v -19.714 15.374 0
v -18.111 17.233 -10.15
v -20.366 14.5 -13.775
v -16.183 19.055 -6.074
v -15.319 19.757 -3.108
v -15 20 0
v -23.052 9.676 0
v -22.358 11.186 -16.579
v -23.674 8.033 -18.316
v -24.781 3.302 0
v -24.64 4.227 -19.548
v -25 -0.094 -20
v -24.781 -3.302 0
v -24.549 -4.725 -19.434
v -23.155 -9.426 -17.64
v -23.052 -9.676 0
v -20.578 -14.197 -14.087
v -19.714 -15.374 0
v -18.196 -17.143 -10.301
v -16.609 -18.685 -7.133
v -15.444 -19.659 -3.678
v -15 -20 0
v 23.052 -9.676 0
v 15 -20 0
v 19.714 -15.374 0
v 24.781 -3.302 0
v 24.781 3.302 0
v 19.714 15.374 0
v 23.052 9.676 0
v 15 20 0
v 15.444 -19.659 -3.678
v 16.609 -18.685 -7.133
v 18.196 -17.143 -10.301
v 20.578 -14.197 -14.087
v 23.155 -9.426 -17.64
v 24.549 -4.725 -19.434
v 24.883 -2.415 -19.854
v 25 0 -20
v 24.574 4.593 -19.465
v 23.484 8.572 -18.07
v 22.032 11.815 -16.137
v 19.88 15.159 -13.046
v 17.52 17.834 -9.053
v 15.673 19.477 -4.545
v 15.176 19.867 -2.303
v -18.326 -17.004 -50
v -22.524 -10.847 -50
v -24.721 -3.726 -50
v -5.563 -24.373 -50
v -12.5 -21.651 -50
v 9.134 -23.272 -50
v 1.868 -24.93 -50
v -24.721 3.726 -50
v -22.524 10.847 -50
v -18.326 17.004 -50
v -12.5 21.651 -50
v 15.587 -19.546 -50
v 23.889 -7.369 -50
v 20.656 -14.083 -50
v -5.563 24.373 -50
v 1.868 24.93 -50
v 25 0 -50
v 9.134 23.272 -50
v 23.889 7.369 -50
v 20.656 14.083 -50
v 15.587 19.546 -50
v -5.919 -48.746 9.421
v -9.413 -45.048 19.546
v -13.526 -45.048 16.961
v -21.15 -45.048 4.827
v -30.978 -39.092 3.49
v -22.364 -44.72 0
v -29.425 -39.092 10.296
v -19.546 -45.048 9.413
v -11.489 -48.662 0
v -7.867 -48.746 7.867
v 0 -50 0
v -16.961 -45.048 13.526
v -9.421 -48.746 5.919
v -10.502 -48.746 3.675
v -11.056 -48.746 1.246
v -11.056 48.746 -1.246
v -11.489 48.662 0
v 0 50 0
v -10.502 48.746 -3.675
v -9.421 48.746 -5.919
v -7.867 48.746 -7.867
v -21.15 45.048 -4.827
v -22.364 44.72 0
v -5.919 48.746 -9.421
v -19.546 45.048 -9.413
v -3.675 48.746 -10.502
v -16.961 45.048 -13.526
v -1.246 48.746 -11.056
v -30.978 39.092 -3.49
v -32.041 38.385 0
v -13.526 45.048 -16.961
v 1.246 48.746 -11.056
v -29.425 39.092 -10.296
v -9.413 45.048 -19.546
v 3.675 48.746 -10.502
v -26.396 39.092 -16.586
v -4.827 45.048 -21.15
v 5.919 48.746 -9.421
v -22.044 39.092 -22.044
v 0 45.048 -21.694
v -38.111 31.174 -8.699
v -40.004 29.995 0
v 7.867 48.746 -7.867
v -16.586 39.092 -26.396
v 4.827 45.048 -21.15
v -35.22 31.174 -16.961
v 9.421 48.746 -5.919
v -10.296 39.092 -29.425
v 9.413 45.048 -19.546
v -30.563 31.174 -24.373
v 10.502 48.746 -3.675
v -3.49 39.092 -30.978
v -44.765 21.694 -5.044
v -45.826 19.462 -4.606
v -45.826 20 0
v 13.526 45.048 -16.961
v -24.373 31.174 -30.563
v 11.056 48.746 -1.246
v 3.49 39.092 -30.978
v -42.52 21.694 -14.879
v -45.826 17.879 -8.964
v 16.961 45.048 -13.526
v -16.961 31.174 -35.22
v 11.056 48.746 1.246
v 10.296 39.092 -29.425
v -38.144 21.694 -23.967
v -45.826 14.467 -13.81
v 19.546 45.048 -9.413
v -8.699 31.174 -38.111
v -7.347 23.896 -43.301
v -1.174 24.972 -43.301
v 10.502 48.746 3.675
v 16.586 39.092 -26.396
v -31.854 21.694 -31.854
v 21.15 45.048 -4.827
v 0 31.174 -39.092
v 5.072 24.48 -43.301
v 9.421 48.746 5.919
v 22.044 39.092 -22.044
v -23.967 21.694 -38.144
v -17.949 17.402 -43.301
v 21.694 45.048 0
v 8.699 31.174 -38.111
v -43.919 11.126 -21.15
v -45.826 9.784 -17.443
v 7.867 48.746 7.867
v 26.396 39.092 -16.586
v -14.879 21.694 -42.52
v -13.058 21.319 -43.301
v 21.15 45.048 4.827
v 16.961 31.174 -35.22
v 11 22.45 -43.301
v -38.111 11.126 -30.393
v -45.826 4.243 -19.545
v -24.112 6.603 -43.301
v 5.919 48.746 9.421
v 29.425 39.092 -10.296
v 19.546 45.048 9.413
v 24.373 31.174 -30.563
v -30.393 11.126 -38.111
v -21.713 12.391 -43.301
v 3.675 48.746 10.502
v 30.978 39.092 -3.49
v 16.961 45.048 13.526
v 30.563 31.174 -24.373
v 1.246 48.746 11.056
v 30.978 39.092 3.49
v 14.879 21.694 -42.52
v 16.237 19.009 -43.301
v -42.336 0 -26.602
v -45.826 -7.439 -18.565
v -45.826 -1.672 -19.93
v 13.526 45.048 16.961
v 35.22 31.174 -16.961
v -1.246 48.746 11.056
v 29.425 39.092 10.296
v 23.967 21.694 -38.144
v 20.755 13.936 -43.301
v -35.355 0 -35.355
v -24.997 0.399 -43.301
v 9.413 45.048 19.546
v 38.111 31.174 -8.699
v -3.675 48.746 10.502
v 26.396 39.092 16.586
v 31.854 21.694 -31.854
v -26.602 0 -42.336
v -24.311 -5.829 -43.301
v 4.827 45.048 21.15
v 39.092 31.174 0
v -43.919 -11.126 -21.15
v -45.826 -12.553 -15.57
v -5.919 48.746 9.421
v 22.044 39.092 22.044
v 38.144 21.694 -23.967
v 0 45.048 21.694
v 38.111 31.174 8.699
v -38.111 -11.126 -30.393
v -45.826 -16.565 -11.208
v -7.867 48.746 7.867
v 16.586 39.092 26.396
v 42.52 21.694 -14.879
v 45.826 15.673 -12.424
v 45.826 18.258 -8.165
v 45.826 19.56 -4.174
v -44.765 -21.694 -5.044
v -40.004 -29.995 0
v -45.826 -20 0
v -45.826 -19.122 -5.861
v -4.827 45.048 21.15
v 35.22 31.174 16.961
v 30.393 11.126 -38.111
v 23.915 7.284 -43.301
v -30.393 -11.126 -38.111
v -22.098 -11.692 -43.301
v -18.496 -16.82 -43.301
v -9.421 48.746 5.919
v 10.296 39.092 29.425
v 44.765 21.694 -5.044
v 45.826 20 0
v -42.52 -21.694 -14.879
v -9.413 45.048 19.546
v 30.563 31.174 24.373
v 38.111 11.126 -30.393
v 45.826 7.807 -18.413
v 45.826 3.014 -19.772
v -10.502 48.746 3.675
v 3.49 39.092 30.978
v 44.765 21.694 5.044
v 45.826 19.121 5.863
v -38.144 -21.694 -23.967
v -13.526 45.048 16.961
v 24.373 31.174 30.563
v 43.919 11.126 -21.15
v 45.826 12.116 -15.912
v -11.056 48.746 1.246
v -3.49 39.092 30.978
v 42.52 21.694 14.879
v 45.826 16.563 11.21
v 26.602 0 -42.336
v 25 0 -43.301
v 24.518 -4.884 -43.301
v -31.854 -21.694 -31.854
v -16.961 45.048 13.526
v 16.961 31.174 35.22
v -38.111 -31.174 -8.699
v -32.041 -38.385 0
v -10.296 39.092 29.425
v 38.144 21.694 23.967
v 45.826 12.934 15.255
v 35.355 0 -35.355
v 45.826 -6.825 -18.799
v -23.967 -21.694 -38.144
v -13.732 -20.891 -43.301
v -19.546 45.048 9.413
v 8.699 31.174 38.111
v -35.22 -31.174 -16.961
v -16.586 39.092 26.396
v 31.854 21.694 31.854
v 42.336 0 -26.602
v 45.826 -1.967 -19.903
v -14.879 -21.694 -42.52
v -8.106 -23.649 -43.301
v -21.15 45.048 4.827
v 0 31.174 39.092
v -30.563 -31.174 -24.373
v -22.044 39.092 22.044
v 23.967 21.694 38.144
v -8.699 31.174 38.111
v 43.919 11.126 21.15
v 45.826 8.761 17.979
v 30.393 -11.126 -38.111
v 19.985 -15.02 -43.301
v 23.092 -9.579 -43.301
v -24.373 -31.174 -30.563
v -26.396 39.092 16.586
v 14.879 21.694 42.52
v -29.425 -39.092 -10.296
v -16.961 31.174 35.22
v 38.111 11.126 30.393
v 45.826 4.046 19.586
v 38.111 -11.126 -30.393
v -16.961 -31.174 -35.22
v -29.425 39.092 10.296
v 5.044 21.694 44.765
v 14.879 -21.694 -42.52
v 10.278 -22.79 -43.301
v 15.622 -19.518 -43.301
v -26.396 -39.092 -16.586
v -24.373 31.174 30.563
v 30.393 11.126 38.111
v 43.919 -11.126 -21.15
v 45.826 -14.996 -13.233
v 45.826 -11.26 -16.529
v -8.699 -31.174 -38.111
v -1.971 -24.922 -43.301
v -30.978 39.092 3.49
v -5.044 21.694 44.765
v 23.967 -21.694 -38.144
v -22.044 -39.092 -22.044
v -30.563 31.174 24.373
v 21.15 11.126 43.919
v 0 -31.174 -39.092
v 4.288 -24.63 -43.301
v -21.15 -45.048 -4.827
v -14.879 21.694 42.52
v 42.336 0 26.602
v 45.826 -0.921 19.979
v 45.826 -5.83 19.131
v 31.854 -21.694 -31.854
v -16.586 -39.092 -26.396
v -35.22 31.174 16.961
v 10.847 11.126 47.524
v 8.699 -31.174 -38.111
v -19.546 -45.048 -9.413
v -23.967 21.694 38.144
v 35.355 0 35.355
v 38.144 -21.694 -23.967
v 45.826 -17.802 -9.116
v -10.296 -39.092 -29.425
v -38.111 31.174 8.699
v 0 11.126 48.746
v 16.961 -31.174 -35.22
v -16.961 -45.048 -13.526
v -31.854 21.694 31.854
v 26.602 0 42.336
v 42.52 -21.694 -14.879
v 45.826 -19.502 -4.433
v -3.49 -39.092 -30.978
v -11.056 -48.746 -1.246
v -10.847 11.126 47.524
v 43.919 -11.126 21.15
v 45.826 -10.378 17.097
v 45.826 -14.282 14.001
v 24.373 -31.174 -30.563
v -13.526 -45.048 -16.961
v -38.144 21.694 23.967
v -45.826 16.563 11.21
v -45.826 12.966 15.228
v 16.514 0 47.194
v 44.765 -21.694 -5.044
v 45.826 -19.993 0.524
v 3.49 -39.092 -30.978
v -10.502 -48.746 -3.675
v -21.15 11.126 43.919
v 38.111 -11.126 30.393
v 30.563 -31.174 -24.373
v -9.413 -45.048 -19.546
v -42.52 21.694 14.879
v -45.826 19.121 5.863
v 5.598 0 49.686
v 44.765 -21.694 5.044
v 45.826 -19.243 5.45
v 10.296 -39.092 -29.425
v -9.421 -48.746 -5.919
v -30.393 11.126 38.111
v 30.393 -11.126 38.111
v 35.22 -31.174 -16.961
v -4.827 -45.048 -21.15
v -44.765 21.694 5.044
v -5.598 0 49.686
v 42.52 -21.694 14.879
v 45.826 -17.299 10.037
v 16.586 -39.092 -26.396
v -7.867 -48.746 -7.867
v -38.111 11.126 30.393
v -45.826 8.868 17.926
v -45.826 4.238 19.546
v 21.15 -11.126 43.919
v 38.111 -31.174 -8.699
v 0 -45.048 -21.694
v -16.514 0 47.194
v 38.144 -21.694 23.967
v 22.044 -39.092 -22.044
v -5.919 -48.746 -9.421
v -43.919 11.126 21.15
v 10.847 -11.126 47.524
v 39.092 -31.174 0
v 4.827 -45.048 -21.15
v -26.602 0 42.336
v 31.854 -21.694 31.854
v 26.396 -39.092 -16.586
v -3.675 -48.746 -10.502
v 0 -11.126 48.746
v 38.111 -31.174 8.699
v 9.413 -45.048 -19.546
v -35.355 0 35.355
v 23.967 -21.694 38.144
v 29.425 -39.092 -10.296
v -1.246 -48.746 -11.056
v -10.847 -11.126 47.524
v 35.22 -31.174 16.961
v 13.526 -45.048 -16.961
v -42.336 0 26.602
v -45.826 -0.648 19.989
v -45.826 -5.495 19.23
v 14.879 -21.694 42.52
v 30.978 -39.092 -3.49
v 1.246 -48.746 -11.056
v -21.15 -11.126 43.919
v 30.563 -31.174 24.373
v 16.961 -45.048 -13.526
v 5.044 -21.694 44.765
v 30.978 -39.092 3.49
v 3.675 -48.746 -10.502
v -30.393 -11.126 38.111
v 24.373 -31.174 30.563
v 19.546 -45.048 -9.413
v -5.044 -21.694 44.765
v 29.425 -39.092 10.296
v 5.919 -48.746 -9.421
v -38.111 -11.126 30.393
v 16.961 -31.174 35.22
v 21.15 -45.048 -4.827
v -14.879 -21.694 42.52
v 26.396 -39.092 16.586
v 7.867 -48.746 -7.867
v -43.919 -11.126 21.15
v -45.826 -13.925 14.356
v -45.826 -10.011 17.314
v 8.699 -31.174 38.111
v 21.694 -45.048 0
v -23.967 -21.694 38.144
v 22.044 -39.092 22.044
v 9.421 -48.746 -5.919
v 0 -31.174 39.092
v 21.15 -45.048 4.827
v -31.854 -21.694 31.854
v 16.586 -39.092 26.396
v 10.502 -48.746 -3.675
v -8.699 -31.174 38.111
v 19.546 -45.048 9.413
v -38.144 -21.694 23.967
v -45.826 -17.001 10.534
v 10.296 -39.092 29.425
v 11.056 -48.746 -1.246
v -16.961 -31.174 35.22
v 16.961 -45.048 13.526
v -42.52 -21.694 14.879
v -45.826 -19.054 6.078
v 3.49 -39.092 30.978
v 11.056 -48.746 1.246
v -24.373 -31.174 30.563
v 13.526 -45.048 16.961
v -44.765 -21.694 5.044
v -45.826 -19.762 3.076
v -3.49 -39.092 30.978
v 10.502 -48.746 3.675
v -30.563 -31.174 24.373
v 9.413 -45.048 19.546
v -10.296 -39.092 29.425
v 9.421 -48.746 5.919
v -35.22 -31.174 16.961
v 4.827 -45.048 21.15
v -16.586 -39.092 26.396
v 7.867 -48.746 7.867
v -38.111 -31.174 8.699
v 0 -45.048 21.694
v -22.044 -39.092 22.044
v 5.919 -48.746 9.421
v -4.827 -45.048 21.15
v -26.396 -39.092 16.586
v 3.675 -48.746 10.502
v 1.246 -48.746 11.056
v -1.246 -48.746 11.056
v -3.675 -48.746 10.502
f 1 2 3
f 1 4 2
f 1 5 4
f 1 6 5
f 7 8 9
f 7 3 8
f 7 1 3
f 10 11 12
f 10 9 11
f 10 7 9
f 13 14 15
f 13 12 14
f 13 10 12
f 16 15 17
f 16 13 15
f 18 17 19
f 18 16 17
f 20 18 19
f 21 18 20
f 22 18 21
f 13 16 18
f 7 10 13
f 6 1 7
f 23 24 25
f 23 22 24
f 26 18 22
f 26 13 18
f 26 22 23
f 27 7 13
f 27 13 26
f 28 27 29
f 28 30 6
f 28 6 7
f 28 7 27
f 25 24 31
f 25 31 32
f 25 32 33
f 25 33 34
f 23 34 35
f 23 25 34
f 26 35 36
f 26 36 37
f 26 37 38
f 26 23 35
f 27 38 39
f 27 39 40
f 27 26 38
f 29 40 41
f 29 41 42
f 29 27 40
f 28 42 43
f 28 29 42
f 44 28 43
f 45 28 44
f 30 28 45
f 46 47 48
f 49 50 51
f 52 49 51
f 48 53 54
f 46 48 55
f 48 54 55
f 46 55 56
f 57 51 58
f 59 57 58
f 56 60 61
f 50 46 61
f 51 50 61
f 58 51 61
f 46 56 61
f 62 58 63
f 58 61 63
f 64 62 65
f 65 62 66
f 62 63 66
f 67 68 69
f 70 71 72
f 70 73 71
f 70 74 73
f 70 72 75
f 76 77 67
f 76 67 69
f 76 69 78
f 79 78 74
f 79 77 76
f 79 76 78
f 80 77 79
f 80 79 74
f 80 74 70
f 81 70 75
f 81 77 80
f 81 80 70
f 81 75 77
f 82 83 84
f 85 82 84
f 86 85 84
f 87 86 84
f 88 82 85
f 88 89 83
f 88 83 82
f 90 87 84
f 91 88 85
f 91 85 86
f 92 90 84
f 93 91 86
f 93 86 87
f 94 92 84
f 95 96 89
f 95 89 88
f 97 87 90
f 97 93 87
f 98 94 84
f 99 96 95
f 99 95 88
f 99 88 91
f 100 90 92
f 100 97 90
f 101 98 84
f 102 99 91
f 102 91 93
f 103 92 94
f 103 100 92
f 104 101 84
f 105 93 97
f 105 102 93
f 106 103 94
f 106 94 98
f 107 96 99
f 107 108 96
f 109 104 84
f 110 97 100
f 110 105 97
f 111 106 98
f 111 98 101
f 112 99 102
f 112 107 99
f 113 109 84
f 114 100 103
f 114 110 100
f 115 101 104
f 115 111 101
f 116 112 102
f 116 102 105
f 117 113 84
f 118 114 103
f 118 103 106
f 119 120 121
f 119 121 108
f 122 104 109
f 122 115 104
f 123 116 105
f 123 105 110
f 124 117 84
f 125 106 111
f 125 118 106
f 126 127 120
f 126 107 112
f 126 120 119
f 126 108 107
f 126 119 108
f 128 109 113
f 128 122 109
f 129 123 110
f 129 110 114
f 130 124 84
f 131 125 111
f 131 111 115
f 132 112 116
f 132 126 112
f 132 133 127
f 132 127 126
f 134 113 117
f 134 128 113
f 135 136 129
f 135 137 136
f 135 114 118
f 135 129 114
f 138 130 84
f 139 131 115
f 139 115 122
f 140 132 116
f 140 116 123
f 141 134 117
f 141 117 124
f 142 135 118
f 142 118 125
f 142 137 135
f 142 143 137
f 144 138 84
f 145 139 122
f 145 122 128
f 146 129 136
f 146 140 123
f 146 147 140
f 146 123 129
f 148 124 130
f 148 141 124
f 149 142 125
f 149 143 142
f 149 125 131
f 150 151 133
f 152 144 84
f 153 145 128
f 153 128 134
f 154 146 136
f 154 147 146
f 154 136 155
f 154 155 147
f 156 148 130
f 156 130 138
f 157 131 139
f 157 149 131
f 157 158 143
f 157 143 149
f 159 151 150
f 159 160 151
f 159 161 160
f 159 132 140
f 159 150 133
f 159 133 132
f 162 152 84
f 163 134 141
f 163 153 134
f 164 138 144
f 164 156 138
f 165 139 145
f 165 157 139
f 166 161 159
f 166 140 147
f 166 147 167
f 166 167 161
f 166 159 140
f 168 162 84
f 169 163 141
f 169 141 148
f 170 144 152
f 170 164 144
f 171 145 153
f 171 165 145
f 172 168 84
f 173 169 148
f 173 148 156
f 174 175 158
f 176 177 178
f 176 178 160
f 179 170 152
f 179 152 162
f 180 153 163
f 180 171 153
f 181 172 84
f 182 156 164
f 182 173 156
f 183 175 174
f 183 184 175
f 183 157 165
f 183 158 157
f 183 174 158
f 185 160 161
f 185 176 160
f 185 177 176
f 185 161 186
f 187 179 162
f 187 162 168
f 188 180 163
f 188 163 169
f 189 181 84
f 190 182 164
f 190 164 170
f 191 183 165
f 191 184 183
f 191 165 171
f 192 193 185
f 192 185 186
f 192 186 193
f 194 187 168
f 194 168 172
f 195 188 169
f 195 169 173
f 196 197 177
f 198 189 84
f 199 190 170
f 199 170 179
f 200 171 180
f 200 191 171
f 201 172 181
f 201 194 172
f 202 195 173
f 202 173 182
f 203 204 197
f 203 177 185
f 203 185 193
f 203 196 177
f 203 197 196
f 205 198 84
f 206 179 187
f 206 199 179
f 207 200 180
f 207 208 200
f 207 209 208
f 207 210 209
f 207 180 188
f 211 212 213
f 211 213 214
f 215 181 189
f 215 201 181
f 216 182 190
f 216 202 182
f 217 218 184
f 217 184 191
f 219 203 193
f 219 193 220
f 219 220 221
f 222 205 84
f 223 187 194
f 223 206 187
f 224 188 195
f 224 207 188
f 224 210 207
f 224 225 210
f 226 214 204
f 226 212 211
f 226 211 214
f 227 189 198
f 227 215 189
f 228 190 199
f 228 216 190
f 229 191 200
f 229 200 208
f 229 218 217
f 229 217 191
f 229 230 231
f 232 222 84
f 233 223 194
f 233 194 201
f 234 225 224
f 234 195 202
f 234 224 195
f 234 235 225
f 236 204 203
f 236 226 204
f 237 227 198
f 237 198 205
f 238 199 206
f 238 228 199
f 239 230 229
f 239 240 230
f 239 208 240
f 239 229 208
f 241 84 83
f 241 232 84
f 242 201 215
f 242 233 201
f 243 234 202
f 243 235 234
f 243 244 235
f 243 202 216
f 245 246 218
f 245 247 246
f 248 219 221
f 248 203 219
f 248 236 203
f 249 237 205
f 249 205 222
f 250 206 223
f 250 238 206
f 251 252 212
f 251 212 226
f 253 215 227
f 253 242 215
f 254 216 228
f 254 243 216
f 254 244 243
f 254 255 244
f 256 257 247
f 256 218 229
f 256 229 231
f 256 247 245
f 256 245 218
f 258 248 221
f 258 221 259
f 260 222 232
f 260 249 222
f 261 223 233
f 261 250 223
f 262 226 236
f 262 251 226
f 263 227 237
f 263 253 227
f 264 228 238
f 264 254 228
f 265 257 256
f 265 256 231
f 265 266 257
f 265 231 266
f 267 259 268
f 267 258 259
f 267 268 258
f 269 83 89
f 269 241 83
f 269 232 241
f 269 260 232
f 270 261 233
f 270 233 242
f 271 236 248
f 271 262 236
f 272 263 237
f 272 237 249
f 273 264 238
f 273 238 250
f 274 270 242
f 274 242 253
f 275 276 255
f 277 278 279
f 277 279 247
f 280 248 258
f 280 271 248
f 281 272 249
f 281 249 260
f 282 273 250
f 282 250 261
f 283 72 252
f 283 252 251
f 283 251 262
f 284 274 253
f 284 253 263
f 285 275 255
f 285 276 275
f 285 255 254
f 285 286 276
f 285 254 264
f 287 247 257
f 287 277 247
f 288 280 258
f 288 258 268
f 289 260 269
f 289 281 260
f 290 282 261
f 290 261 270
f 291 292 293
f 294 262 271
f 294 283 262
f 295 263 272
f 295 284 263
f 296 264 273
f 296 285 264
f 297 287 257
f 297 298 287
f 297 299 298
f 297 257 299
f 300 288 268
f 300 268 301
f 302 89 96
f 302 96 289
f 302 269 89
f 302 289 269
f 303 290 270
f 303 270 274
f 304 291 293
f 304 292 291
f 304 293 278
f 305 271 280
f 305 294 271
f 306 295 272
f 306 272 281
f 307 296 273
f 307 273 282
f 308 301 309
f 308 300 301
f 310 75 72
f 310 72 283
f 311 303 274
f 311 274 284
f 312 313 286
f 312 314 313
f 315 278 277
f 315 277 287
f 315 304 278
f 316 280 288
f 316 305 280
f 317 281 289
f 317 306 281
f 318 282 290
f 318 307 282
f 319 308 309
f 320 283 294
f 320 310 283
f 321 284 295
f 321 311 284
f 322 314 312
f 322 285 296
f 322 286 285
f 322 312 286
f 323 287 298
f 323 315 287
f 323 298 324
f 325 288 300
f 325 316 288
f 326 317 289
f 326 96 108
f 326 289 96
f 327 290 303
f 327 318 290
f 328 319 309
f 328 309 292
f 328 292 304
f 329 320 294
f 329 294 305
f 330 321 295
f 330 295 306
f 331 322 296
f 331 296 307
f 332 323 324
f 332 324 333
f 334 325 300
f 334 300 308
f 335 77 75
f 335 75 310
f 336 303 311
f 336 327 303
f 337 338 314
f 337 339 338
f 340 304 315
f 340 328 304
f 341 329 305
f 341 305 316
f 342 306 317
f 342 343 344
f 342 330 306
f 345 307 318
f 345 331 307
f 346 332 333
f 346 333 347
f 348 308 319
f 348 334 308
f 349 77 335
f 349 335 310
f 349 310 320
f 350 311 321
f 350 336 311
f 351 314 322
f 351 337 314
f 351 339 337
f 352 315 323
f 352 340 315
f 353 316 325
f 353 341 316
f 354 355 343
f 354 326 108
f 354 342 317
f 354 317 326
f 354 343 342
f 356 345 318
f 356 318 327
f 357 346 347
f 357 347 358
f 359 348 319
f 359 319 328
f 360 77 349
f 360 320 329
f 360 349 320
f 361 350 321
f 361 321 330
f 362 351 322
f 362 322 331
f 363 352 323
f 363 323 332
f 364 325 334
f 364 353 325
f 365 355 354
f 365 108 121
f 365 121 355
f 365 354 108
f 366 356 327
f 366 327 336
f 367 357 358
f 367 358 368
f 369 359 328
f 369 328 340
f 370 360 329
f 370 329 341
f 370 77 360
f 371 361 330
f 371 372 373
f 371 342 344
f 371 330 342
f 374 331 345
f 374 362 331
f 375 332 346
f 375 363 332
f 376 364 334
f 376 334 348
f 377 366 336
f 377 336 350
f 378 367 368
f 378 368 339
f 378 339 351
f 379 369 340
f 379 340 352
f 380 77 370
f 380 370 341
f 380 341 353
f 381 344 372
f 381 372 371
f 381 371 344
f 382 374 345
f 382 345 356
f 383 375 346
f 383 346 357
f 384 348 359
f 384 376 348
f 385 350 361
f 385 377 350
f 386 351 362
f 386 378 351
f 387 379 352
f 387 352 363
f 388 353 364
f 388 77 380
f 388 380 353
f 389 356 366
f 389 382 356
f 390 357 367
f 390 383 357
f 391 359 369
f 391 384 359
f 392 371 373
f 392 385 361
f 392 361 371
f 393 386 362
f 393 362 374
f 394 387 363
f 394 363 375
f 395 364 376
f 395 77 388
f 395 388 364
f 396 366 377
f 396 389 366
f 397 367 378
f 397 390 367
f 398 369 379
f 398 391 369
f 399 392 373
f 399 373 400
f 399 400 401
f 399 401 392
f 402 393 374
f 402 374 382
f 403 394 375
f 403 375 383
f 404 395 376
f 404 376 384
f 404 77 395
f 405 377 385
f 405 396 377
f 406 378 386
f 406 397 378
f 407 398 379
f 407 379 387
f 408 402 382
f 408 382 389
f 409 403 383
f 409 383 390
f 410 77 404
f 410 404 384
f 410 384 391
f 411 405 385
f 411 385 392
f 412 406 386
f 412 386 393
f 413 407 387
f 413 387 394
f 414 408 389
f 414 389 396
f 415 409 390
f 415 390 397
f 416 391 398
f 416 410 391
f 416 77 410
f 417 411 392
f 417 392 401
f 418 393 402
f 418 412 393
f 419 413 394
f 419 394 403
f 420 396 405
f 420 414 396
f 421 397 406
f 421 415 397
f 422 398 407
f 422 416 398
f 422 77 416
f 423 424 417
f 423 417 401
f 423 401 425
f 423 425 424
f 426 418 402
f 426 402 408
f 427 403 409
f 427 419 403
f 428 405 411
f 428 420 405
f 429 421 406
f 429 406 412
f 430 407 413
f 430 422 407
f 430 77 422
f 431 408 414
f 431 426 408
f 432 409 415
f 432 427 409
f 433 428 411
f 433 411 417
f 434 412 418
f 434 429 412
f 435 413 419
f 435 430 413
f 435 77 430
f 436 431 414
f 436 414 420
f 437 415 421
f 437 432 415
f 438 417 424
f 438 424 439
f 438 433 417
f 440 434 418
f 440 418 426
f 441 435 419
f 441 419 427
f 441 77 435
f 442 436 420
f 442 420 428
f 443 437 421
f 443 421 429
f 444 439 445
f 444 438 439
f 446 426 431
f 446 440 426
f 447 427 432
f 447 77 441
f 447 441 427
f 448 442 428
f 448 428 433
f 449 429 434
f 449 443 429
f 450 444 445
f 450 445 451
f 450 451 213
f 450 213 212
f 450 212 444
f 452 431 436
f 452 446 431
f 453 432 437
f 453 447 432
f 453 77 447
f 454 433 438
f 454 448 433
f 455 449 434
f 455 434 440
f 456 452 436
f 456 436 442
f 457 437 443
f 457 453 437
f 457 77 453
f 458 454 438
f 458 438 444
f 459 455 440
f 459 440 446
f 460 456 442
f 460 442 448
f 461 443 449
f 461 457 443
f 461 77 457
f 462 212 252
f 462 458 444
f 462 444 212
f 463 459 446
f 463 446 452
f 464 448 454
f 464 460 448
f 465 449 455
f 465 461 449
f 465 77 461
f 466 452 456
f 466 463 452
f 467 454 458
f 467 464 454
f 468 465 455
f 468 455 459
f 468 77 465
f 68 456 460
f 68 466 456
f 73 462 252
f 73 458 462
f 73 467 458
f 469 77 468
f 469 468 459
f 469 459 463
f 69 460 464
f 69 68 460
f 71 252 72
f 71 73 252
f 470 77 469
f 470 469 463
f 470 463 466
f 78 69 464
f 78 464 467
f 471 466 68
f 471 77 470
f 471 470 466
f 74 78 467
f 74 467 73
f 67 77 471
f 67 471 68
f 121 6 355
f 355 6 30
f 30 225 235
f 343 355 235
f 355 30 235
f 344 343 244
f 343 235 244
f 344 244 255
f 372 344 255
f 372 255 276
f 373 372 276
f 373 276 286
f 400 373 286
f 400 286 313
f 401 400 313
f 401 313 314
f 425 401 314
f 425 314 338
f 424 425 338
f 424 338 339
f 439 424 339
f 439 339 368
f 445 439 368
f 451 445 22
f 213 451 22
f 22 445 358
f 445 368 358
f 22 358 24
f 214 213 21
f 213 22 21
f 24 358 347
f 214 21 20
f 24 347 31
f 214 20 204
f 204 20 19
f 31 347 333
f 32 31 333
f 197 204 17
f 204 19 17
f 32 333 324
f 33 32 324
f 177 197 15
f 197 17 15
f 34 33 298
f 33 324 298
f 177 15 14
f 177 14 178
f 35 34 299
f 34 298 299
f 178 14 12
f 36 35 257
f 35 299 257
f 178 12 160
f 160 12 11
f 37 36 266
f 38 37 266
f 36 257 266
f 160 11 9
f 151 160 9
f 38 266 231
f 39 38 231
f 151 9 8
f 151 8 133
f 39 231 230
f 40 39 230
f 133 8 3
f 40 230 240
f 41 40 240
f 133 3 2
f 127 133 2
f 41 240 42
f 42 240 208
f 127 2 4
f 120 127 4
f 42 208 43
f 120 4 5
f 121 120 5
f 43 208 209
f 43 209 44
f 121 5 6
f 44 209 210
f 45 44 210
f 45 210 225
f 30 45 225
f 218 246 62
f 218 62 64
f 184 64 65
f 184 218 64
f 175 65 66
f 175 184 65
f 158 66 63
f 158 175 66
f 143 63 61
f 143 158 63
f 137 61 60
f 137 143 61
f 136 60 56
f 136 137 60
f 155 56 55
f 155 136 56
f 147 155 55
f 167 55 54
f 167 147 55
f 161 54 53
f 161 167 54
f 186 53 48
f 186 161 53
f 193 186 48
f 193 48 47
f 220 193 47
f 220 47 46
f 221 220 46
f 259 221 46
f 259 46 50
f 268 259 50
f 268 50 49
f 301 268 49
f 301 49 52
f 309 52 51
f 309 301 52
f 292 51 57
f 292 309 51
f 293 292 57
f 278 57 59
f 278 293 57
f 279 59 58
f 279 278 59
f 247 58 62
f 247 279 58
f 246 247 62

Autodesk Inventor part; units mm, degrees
ref_plane "XY Plane" through (0, 0, 0) normal (0, 0, 1) x (1, 0, 0)
sketch "スケッチ1" plane through (0, 0, 0) normal (0, 0, 1) x (1, 0, 0)
  arc A0 (0, 50) -> (0, -50) centre (0, 0) ccw
  line L0 (0, 50) -> (0, -50)
  dimension "d0" = 100
revolve "回転1" add sketch "スケッチ1" angle 360 about axis through (0, 50, 0) along (0, -1, 0)
sketch "スケッチ3" plane through (0, 0, 0) normal (1, 0, 0) x (0, 1, 0)
  circle A0 centre (0, 0) radius 20
  dimension "d4" = 40
extrude "押し出し2" cut sketch "スケッチ3" along normal mid plane 100
sketch "スケッチ4" plane through (0, 0, 0) normal (0, 0, 1) x (1, 0, 0)
  circle A0 centre (0, 0) radius 25
  dimension "d7" = 50
extrude "押し出し3" add sketch "スケッチ4" against normal blind 50
properties part number "UpperlegR"
